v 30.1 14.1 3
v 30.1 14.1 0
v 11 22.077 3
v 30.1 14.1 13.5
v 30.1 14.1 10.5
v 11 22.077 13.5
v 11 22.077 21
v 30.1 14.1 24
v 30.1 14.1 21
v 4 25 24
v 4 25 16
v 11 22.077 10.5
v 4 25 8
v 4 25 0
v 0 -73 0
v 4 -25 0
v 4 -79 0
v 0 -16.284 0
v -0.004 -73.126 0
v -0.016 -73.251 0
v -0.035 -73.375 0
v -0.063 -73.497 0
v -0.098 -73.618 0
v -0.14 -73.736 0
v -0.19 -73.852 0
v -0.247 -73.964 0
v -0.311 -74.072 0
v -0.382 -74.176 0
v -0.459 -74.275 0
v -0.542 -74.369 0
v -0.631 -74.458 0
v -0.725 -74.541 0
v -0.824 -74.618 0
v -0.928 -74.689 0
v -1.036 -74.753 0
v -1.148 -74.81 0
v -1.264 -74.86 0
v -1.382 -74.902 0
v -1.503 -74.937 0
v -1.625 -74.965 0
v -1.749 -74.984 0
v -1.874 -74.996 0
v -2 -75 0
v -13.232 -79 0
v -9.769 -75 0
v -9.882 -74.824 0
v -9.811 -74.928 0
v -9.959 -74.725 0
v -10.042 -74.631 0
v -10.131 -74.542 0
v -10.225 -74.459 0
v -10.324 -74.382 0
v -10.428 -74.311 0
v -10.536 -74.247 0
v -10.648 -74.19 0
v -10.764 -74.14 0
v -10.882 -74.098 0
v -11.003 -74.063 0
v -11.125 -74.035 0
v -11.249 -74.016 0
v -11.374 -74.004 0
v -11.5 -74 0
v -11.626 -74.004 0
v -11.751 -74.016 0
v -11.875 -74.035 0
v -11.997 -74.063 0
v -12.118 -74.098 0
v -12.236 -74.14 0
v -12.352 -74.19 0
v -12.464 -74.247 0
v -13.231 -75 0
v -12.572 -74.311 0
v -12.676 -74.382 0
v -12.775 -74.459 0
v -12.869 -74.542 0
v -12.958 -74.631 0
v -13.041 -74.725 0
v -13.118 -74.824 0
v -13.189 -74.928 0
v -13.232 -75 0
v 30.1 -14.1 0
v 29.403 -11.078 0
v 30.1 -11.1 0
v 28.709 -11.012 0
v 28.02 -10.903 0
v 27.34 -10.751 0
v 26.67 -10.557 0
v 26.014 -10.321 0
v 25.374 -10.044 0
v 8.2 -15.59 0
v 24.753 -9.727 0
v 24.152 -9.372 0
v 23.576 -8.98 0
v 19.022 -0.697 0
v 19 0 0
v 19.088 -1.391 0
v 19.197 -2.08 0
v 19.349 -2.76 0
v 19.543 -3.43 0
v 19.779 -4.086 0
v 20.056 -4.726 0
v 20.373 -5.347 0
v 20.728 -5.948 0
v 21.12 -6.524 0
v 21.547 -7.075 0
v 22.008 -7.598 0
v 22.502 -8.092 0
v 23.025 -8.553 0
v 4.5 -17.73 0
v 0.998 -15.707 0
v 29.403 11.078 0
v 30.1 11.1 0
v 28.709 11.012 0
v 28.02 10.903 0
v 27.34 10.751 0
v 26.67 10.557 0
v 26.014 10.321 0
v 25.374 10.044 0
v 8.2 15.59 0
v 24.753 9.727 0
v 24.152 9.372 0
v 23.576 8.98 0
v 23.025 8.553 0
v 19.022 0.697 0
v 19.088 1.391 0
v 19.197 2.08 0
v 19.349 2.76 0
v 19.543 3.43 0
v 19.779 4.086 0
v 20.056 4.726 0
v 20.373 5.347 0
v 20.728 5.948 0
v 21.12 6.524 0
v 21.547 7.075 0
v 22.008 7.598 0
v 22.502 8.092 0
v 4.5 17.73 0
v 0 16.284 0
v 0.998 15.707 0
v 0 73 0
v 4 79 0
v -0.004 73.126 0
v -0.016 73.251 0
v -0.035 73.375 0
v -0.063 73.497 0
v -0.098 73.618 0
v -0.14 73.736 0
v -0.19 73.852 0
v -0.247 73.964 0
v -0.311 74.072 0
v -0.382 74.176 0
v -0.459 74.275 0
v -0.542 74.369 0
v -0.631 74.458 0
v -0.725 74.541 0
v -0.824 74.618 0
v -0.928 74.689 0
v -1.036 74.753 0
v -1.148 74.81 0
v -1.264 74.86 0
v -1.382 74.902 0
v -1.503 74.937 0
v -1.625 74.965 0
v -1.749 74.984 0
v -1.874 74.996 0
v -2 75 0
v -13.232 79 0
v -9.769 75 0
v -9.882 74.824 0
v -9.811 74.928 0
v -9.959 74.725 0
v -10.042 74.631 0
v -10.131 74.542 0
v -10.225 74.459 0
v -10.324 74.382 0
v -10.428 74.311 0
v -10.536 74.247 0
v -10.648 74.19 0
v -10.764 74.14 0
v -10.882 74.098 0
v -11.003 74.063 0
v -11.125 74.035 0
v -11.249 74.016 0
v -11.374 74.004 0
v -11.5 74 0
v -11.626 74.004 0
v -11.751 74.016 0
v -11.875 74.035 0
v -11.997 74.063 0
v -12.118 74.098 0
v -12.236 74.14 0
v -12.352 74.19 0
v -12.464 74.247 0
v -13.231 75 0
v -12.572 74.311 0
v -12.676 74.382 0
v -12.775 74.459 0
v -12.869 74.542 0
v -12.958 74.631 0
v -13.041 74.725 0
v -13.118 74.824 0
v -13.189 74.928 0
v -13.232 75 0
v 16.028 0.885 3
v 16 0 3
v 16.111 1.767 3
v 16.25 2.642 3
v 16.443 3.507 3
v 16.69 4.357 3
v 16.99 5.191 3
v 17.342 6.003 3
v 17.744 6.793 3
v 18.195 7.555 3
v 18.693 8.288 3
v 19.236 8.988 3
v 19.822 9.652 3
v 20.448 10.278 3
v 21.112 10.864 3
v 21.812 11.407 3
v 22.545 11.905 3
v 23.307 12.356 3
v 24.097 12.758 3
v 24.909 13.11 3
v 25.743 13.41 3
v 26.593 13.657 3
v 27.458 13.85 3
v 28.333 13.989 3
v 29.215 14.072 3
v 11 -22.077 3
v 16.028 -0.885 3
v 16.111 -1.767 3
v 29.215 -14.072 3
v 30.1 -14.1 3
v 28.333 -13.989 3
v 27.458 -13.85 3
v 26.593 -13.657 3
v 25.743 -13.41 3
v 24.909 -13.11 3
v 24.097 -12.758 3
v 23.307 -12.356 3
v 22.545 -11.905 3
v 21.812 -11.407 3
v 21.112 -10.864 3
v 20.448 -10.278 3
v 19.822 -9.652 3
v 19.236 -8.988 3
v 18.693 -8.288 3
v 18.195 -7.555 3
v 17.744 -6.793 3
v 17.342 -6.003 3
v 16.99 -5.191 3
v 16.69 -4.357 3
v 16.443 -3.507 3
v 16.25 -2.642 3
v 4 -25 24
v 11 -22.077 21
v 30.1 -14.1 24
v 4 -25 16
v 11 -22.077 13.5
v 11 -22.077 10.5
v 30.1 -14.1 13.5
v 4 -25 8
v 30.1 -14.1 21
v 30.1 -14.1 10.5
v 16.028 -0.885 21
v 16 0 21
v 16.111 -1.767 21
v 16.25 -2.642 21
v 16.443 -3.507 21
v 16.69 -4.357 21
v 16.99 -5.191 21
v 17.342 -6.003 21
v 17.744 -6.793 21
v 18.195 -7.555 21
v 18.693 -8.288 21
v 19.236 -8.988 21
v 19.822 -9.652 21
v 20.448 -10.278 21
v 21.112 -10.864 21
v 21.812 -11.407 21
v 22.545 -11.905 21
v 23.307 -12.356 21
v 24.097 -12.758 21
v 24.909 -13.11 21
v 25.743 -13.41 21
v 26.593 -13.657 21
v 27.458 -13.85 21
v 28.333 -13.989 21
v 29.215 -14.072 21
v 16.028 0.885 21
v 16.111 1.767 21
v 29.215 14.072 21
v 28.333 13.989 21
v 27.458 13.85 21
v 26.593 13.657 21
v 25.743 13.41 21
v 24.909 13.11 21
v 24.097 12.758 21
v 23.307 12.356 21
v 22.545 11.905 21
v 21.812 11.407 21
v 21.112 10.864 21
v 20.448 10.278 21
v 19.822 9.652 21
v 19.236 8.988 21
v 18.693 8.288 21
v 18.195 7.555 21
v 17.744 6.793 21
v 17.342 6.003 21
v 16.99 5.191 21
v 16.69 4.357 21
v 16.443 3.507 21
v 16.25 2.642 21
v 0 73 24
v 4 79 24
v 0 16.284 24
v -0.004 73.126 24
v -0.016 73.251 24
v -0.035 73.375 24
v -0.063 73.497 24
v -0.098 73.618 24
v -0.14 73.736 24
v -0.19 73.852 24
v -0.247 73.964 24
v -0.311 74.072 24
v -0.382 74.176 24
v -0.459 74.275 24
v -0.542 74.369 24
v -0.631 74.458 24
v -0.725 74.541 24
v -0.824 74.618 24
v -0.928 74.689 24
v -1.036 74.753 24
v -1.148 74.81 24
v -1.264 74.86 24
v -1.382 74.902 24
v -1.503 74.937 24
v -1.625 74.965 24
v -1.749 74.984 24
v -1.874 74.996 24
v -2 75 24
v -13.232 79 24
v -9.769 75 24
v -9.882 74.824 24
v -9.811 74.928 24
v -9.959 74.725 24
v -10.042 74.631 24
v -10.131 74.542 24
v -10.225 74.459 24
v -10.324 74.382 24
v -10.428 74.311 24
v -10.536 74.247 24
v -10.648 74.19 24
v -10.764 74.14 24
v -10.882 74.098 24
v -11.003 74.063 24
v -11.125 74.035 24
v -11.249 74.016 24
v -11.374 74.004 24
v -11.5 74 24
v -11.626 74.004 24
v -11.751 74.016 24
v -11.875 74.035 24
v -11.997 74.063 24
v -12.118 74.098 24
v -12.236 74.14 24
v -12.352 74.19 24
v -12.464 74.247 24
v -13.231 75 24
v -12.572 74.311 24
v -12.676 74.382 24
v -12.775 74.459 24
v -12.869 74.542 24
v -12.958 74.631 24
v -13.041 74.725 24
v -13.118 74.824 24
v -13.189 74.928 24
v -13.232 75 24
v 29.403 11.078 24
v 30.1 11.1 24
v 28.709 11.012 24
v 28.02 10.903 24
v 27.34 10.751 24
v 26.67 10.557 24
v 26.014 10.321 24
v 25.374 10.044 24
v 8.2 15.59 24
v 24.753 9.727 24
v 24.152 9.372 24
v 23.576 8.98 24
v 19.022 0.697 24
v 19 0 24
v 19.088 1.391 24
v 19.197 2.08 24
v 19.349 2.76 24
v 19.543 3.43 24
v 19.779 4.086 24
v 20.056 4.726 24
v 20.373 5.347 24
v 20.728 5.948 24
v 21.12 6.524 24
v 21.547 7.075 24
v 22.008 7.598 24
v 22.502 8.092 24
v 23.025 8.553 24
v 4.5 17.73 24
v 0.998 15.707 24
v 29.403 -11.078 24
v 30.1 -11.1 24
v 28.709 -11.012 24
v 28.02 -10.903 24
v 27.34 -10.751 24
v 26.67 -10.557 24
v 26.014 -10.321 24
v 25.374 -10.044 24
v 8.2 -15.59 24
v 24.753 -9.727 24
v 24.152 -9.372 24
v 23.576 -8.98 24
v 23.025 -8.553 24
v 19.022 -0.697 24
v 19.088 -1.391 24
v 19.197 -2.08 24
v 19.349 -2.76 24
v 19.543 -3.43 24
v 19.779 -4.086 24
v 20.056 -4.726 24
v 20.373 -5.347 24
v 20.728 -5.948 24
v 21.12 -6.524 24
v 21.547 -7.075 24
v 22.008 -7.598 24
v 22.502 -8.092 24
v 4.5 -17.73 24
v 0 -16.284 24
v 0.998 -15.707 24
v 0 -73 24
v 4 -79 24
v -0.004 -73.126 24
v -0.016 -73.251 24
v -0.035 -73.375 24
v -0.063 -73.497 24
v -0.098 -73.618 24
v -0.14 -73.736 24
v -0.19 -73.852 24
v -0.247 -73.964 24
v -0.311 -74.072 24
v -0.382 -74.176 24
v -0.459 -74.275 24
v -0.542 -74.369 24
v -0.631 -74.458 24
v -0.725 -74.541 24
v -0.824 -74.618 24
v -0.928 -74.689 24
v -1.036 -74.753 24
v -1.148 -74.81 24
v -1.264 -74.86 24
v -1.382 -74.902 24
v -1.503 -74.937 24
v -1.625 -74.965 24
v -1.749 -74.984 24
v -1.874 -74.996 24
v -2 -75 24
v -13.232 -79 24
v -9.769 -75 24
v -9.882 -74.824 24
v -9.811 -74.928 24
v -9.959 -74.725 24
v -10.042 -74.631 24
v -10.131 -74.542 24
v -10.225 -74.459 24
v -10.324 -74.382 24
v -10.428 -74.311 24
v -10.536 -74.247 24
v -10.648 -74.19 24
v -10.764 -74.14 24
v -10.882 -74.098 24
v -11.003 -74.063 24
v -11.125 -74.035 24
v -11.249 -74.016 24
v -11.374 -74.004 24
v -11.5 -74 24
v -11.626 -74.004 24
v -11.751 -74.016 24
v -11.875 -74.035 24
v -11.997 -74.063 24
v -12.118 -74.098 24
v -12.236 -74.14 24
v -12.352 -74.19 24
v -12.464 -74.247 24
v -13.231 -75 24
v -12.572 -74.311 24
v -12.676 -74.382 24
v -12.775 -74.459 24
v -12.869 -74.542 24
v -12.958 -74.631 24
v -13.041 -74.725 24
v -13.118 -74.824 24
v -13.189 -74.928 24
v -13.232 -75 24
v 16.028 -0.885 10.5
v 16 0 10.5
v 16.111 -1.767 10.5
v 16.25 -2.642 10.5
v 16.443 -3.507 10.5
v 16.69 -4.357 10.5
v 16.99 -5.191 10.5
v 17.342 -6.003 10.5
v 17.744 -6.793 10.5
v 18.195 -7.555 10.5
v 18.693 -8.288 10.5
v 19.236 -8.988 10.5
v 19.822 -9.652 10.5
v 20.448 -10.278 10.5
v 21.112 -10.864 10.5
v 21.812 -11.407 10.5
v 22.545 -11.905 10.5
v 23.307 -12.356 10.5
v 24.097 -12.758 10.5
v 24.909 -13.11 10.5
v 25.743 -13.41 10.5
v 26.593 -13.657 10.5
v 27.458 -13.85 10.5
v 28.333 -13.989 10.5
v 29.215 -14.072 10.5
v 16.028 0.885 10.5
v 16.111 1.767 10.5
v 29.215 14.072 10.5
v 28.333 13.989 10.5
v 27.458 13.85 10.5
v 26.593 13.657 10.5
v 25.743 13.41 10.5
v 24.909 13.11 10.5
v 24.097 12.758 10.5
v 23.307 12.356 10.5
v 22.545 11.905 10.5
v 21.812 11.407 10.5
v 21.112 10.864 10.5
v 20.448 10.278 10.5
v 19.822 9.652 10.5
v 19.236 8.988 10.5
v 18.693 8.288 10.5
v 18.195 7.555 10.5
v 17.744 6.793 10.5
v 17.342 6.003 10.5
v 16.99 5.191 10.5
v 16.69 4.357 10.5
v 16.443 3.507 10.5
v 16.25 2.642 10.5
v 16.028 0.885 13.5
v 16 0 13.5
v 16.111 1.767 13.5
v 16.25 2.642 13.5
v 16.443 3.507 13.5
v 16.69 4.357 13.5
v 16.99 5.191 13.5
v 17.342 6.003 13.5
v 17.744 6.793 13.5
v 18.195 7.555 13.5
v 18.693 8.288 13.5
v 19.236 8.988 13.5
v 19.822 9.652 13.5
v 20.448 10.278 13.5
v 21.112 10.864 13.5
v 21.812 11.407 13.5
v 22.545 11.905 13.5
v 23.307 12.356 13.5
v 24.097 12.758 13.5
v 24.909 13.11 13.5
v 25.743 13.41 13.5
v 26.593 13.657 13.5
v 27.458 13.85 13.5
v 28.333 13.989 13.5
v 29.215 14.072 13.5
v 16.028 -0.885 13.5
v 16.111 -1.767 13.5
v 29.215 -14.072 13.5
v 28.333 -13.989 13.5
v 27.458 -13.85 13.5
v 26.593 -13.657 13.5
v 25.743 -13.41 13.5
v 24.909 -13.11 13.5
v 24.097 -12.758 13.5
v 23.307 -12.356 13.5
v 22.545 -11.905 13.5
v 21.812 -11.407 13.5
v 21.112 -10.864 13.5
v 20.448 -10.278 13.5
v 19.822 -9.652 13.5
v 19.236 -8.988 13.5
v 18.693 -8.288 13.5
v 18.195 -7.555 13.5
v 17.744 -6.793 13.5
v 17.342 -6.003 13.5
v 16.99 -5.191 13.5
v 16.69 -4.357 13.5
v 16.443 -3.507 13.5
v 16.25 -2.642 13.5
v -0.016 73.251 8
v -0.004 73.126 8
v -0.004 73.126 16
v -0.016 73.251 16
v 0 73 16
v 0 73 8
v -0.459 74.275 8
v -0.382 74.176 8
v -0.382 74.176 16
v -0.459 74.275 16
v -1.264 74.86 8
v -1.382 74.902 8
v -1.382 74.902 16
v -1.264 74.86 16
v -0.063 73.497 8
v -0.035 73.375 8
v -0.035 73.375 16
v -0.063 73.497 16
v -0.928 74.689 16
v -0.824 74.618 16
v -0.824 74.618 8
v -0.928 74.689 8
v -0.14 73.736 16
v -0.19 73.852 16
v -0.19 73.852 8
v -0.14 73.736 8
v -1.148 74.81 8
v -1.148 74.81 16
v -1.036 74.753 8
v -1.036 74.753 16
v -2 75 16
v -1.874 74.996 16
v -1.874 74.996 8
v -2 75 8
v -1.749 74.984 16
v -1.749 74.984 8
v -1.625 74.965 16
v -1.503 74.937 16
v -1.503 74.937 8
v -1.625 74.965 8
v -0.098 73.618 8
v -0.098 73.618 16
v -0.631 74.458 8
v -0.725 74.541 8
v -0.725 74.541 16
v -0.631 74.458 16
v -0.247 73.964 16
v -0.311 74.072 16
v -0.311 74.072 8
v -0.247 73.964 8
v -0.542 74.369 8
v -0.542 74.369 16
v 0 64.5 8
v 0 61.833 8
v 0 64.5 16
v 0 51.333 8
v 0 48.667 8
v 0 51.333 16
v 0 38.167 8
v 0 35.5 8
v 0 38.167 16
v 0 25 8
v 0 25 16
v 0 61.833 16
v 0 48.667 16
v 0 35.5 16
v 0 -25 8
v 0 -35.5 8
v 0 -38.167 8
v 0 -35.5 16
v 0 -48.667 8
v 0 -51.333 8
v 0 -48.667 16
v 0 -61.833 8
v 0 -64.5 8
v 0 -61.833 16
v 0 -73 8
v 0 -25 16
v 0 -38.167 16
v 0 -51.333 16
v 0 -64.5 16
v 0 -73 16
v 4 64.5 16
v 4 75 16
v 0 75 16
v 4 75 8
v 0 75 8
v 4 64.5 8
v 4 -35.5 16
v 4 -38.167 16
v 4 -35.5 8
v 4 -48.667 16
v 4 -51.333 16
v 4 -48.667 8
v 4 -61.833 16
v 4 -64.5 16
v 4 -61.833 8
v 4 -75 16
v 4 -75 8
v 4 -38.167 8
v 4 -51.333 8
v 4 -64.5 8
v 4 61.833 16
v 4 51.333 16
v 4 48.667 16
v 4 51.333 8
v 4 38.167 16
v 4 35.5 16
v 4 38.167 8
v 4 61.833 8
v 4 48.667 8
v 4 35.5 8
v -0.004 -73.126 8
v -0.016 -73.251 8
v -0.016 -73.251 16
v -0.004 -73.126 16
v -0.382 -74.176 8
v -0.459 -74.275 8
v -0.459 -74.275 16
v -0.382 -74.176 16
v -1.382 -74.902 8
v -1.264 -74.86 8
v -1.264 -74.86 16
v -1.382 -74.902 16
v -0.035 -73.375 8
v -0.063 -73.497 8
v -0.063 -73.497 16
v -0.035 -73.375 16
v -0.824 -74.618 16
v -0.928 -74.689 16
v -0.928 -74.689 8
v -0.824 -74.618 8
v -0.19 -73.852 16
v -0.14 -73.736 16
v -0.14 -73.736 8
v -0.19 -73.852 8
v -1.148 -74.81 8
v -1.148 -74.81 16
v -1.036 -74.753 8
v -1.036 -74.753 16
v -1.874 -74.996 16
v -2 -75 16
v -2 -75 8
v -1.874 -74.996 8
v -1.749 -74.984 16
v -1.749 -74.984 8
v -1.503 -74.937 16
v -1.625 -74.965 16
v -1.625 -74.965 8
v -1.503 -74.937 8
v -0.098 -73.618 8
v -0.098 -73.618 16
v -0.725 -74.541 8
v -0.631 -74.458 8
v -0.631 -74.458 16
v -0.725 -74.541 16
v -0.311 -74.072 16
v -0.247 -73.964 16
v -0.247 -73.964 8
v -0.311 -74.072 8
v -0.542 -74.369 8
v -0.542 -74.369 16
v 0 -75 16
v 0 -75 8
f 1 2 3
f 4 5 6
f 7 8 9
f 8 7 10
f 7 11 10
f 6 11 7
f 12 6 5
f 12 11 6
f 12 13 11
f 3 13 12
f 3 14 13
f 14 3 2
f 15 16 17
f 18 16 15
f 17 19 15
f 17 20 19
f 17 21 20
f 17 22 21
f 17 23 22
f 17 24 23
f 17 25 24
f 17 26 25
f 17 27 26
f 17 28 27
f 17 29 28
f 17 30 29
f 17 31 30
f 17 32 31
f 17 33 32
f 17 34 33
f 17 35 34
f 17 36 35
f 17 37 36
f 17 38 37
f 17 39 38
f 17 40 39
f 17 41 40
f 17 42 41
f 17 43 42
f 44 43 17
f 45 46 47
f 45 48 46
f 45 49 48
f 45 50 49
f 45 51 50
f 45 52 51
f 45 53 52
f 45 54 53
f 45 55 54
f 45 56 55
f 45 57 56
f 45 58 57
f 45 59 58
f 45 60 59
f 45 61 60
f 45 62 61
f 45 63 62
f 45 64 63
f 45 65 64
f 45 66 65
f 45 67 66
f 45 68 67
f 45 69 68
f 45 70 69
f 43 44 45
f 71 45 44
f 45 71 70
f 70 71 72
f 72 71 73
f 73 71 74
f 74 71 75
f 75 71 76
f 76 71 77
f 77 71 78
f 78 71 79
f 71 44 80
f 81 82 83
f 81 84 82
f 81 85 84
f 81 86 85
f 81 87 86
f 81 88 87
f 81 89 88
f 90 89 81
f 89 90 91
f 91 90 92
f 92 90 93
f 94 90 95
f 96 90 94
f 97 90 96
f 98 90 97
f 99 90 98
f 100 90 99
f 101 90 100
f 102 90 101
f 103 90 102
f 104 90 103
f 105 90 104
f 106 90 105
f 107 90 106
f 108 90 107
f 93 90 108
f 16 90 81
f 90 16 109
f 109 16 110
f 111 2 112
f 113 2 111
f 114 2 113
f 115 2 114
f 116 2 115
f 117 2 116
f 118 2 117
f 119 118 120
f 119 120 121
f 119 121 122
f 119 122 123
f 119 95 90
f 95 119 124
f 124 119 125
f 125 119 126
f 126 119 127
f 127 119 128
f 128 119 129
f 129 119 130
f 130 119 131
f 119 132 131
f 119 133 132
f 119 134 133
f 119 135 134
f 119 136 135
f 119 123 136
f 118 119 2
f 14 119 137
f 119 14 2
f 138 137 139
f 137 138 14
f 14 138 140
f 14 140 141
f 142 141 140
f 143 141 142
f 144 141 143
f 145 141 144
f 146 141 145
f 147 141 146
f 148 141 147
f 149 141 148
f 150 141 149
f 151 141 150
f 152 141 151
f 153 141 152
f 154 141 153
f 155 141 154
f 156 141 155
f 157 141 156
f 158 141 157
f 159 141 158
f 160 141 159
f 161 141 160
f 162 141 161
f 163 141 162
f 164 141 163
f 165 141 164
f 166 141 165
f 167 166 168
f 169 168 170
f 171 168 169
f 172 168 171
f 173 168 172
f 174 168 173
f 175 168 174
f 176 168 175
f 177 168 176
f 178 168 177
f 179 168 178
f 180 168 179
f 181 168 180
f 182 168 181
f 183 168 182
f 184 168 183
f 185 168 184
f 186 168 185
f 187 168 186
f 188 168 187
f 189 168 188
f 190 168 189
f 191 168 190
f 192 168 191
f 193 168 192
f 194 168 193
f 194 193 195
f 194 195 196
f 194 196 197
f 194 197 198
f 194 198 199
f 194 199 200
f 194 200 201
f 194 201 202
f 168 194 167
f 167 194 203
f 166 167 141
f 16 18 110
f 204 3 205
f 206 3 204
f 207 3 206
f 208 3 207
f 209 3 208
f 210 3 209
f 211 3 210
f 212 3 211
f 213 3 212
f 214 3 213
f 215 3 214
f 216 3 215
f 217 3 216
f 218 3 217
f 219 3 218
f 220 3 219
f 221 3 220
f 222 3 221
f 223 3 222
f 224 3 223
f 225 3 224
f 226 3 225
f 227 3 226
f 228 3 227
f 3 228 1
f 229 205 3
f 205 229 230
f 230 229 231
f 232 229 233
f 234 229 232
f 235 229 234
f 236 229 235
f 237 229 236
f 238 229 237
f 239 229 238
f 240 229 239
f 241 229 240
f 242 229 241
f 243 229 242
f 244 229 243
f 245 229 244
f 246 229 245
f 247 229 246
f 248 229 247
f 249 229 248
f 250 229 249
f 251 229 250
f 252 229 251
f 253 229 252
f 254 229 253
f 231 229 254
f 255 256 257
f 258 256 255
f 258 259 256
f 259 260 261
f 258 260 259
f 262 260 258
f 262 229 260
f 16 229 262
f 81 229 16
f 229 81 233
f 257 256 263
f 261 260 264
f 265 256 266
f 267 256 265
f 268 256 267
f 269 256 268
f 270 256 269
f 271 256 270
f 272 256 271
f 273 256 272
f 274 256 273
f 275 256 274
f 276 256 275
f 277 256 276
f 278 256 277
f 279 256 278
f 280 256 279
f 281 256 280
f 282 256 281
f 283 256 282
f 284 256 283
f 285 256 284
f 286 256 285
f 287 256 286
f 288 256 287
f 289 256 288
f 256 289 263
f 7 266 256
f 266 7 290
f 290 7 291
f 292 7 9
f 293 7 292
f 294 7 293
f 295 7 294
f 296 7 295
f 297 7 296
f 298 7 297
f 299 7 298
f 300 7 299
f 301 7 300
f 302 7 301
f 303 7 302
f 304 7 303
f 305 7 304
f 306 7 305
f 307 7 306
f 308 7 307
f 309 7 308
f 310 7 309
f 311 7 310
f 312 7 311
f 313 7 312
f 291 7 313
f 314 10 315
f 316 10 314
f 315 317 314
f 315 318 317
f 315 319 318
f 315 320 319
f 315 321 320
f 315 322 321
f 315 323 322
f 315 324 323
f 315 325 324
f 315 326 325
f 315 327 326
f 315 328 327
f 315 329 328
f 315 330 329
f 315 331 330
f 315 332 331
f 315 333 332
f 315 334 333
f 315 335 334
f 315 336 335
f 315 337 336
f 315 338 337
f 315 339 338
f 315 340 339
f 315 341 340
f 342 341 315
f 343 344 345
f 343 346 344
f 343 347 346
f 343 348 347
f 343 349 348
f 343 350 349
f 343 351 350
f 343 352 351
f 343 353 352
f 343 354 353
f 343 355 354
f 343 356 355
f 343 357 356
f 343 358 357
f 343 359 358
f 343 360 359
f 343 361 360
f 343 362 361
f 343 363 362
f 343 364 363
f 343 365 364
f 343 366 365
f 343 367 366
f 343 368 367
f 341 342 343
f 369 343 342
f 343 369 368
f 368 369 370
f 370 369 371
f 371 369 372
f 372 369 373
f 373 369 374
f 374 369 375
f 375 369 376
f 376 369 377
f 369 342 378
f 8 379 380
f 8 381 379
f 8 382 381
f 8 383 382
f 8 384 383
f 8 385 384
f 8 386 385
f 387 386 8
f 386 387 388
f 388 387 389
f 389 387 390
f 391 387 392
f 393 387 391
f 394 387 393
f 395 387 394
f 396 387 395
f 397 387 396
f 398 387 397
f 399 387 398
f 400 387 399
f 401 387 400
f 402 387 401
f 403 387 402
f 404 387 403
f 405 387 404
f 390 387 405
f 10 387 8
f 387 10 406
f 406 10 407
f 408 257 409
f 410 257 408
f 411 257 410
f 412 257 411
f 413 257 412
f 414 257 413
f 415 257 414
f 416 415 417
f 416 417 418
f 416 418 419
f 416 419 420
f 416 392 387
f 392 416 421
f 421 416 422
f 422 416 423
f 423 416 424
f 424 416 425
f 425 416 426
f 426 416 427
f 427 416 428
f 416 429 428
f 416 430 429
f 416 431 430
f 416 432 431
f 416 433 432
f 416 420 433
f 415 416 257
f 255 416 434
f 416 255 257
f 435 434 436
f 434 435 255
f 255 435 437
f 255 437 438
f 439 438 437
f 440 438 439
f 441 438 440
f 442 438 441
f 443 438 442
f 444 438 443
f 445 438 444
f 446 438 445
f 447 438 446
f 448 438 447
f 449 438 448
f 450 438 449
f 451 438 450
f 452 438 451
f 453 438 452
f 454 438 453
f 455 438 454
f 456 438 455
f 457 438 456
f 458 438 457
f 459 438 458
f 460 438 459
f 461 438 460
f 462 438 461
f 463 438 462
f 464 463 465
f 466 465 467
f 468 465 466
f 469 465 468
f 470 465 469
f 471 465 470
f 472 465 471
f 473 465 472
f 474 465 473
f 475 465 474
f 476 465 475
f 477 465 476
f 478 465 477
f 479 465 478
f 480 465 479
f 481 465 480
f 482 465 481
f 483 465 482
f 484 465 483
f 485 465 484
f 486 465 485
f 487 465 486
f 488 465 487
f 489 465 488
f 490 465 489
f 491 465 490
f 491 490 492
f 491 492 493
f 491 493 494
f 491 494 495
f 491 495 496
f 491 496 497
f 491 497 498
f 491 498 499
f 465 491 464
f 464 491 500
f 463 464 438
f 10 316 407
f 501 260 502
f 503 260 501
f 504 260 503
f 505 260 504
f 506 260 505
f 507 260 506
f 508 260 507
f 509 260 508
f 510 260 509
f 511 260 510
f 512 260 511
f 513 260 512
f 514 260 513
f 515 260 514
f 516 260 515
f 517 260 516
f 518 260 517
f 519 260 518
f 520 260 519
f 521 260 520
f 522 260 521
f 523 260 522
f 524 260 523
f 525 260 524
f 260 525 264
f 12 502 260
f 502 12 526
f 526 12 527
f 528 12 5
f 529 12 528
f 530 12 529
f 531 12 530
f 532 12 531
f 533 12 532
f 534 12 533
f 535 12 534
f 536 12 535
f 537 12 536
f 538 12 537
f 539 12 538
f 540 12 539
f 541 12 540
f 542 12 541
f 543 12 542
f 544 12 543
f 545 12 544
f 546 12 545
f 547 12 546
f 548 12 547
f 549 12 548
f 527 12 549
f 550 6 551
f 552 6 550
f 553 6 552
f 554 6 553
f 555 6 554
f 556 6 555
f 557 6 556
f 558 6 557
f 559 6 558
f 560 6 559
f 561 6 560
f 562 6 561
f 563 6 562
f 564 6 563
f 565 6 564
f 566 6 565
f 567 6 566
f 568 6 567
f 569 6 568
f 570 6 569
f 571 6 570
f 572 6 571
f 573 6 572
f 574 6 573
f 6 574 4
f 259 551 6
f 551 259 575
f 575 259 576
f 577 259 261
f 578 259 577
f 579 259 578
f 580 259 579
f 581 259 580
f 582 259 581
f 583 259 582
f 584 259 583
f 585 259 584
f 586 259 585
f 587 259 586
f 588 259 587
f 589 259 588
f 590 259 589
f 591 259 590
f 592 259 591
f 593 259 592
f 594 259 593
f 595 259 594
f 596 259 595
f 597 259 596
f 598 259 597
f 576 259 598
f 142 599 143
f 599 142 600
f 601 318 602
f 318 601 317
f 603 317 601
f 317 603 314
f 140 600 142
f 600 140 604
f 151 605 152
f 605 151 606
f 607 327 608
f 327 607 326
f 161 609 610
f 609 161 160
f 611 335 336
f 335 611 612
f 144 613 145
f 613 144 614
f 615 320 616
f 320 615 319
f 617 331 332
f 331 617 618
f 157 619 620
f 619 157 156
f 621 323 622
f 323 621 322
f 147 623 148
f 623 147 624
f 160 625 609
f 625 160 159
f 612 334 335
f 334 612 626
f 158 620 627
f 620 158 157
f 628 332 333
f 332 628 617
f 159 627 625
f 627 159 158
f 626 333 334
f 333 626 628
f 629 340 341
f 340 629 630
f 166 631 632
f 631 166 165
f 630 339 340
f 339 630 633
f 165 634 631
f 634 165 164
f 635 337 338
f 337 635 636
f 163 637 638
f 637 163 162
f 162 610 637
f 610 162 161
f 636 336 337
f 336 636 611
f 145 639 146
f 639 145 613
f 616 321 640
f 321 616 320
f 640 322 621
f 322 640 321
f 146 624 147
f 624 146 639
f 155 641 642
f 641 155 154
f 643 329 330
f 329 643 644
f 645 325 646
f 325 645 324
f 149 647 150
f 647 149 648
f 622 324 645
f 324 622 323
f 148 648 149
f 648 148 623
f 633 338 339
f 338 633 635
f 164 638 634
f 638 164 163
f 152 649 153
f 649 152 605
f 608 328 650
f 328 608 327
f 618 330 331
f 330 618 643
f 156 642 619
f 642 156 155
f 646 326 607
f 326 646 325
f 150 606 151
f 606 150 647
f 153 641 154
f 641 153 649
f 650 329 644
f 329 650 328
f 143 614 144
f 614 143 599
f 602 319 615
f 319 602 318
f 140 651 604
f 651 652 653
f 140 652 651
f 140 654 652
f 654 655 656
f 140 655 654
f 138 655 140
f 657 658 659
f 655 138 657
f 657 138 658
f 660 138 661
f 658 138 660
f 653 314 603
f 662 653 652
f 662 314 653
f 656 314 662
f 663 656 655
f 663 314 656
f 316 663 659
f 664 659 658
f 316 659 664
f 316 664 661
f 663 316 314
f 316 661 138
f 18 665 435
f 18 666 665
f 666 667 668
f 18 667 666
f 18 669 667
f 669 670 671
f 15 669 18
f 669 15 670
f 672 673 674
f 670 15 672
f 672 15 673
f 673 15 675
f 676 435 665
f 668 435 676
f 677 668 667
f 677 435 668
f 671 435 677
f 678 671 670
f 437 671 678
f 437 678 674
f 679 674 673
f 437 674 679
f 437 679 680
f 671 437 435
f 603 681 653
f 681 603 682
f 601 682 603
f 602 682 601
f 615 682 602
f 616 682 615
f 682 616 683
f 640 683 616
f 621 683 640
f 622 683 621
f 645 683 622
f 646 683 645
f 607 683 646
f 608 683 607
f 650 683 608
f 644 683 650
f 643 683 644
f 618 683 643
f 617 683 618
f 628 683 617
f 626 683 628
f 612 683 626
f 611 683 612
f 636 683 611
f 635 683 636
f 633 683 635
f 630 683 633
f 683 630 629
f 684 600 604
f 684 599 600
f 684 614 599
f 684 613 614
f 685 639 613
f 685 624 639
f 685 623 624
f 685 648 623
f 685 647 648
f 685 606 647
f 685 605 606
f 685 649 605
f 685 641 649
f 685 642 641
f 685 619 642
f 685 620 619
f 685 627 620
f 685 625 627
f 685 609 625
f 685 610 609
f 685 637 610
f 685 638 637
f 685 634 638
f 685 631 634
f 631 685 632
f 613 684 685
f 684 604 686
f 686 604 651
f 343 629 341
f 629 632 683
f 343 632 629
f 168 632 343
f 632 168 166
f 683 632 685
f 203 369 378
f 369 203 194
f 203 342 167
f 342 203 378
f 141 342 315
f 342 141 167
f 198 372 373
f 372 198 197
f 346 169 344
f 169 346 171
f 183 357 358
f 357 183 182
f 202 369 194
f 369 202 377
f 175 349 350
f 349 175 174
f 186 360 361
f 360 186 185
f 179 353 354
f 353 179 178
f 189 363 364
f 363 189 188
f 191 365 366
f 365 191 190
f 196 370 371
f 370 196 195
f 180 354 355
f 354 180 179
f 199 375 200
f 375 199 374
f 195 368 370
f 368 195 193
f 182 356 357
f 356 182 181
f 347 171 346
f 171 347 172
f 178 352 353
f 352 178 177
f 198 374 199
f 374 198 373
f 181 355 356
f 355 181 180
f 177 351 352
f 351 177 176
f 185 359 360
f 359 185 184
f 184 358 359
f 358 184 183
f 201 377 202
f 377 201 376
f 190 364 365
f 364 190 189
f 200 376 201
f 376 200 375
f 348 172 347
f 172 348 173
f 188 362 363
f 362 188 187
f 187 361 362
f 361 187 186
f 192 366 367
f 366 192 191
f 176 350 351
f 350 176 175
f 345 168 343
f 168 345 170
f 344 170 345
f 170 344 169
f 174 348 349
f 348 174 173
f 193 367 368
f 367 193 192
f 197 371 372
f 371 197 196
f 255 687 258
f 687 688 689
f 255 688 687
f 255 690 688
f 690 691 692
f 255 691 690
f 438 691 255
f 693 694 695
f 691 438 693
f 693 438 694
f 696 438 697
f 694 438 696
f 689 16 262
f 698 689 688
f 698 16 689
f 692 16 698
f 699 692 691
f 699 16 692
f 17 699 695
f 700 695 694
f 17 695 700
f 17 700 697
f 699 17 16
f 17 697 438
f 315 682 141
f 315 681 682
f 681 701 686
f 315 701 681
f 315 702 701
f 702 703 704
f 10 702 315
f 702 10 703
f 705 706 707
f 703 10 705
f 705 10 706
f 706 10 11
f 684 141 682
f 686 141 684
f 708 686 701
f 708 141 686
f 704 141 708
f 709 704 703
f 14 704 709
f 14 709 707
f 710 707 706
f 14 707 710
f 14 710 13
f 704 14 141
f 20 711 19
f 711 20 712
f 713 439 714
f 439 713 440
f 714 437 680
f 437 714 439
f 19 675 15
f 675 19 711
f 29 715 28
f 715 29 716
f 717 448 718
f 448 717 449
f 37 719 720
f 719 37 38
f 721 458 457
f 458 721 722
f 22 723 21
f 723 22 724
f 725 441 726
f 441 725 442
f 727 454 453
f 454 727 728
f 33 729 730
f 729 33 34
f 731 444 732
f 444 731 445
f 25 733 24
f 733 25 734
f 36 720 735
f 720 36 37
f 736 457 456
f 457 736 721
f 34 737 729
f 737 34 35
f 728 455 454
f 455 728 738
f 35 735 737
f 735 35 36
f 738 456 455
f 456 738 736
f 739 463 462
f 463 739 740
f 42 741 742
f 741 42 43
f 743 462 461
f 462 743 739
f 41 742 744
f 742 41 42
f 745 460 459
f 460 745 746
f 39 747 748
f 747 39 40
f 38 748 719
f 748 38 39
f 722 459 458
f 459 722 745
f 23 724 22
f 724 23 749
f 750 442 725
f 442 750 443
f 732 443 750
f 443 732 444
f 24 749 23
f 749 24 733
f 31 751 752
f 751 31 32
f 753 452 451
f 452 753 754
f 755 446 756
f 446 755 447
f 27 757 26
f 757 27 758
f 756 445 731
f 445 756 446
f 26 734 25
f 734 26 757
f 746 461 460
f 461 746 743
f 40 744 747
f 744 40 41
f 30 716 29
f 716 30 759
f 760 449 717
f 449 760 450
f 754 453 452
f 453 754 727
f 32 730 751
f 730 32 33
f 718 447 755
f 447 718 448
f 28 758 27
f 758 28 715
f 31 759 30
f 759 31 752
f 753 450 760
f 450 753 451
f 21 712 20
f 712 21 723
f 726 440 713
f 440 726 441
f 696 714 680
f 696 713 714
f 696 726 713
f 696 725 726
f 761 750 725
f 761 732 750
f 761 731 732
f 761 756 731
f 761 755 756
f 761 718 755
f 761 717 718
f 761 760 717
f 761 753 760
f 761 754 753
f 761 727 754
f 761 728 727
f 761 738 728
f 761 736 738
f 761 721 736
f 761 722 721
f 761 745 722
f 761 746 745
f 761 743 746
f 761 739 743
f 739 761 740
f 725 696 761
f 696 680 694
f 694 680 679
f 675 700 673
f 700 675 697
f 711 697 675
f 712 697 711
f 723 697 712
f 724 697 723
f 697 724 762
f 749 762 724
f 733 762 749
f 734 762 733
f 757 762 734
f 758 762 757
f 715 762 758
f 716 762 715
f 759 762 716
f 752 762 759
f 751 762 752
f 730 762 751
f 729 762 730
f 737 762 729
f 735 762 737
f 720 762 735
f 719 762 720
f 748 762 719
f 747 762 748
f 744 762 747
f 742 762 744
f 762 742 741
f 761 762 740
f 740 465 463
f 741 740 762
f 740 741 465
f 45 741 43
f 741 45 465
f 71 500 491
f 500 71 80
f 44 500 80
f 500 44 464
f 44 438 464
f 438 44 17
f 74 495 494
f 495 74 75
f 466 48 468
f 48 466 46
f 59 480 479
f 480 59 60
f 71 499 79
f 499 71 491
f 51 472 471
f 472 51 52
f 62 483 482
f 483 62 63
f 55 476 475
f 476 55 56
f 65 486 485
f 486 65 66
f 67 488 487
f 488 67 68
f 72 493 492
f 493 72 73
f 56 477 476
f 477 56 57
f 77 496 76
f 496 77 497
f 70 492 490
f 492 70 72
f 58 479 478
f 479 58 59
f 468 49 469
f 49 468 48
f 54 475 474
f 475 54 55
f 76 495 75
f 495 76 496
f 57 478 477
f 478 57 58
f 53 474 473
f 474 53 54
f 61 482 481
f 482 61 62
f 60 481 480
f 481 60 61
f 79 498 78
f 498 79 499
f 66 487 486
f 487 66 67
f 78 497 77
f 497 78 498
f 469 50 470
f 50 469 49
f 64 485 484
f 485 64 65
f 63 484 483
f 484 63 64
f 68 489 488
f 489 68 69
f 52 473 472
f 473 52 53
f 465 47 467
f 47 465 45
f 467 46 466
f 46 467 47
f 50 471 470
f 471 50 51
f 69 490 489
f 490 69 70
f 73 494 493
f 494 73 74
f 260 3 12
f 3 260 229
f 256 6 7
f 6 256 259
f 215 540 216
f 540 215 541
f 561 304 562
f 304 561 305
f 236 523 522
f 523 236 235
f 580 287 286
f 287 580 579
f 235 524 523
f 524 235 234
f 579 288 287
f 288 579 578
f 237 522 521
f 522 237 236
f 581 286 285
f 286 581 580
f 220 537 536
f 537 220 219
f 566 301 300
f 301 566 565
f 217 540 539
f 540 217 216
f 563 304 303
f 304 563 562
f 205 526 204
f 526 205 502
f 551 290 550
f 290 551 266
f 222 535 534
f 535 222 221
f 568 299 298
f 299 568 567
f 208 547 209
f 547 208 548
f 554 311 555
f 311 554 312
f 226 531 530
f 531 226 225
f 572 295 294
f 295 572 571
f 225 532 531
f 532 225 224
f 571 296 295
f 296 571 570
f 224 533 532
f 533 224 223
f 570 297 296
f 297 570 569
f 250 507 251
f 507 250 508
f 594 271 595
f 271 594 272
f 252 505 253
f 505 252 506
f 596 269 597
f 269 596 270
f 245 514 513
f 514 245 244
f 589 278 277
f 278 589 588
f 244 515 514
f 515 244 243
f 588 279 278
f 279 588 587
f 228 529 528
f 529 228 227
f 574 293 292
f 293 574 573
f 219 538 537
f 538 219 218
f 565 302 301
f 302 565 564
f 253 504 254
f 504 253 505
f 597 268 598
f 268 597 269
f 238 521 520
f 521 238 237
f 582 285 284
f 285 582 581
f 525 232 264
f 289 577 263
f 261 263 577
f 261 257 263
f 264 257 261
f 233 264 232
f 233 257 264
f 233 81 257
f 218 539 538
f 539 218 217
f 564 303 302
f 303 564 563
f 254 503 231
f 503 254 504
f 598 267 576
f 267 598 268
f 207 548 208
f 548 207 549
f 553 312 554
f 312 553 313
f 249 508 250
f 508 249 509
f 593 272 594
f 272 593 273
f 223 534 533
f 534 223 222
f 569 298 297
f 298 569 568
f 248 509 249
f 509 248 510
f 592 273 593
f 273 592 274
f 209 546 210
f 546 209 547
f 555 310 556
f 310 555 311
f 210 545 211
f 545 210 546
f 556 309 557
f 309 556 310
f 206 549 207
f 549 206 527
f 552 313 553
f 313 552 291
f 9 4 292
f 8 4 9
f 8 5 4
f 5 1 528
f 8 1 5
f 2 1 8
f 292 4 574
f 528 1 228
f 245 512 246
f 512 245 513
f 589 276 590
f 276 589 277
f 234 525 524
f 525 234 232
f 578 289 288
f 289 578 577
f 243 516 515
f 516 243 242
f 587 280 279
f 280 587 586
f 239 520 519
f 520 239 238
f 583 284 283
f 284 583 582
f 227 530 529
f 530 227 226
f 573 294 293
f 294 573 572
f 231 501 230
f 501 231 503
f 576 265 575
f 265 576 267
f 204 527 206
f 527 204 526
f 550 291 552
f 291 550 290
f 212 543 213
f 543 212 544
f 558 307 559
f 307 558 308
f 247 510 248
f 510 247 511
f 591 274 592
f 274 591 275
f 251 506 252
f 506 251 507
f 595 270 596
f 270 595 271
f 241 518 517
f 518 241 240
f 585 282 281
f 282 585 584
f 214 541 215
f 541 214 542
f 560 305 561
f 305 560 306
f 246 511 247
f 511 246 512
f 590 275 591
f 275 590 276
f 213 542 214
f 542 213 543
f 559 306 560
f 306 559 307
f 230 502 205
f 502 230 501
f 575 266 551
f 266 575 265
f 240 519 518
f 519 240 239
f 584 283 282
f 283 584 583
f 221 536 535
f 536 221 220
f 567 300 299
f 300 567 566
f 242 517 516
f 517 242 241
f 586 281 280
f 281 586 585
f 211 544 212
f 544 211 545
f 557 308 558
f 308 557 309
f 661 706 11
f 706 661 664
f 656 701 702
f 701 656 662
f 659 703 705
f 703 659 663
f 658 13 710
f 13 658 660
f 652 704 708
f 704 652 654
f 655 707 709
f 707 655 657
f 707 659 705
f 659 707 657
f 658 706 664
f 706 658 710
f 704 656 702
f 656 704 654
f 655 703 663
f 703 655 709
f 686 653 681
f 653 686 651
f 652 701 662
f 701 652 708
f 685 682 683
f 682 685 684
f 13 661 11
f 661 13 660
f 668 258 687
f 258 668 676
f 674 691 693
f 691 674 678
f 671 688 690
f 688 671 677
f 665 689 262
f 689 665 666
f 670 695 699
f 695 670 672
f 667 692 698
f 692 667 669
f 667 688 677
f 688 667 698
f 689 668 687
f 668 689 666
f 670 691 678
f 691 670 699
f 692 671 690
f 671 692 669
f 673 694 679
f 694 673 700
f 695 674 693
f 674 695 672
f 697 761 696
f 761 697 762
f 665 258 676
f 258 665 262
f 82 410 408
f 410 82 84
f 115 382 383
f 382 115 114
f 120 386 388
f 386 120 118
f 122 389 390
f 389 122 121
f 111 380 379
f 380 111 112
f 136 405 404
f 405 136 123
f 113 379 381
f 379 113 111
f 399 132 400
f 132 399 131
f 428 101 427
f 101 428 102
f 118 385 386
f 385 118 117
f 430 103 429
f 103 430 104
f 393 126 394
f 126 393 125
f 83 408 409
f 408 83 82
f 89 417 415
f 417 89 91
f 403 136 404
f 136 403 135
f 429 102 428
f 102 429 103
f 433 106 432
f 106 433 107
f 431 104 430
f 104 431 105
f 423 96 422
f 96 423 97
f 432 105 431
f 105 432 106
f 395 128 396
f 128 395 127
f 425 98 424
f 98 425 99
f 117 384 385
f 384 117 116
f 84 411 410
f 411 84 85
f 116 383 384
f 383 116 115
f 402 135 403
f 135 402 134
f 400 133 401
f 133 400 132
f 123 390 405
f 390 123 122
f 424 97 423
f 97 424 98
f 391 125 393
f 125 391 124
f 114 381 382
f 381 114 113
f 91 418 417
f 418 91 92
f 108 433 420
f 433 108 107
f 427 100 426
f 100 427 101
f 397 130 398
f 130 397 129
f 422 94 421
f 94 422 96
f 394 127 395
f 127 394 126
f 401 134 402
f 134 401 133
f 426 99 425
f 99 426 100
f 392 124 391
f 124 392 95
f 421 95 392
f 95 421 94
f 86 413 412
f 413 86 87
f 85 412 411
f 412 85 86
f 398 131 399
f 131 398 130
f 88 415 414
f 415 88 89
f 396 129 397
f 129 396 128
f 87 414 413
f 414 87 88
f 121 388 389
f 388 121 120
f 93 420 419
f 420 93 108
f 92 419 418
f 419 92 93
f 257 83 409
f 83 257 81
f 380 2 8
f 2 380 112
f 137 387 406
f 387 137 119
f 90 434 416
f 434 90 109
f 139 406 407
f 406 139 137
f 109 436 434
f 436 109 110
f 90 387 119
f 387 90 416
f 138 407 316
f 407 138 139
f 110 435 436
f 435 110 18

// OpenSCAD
//circle resolution
$fn=100;

//total width of the mount
mountHeight = 24; 

//length of your phone or case
phoneLength = 150; 

//thickness of the arm
armThickness = 4; 

//width of each arm
armWidth = 8;

//maximum distance between braces in the arms
maxBridge = 13;

//height of the tab on the two ends of phone
phoneThickness = 9.5; 

//radius of the fillets
filletRadius = 2;

//diameter of the handlebar on your bike
barDiameter = 22.2; 

//thickness of the three plates
finThickness = 3; 

//thickness of the arc surface
cylinderThickness = 3; 

//offset of the cutout grabing the phone clamp, larger is looser
tolerance = 0.05;

offsetDepth = 16+cylinderThickness+barDiameter/2;

hexPts = [
    [0,-15.08-tolerance], //0
    [0,15.08+tolerance], //1
    [4.5,17.68+tolerance], //3
    [8.2,15.54+tolerance], //5
    [8.2,-15.54-tolerance], //4
    [4.5,-17.68-tolerance], //2
    ];

module hex () {
    linear_extrude(height=mountHeight) polygon(hexPts);
}

finPts = [
    [armThickness,25],
    [armThickness,-25],
    [offsetDepth,-barDiameter/2-cylinderThickness],
    [offsetDepth,barDiameter/2+cylinderThickness],
];

module hexClamp (){
    difference (){
        linear_extrude(height=mountHeight) polygon(finPts);
        translate ([11,-25,0]){    
            cube([offsetDepth,50,mountHeight],center=false);
        }
    }
    
}

module fin () {
    linear_extrude(height=finThickness) polygon(finPts);
}


module arm () {
translate([0,-phoneLength/2,0]) {
    cube(size = [armThickness,phoneLength,mountHeight], center = false);
    }
}

module armHollow(){
    translate ([0,25,armWidth]) {
    difference() {
        cube ([armThickness,phoneLength/2-25,mountHeight-armWidth*2],center=false);
        armBraces();
    }
}
}

module armBraces(){
    braceWidth   = max(2, armWidth/3);
    hollowLength = phoneLength/2 - 25;
    hollowWidth  = mountHeight-(2*armWidth);
    numBraces    = floor((hollowLength/maxBridge - 1) / (1 - braceWidth/maxBridge));
    bridgeLength = (hollowLength/(numBraces+1)) - (braceWidth*numBraces/(numBraces+1));
    echo("Brace Width: ", braceWidth);
    echo("number of Braces: ", numBraces);
    echo("bridge length: ", bridgeLength);
    
    for (i = [1:1:numBraces]) {
        translate([0,bridgeLength*i + braceWidth*(i-1)])
        cube ([armThickness, braceWidth, hollowWidth], center=false);
    }
}

module tab(){
    translate([-phoneThickness,phoneLength/2,0]) {
        cube(size=[armThickness+phoneThickness,armThickness,mountHeight], center = false);
        //fillet
        translate([phoneThickness-filletRadius,-filletRadius]) {
            difference() {
                cube(size = [filletRadius, filletRadius, mountHeight], center = false);
                union() {
                    cylinder(mountHeight, filletRadius, filletRadius, center=false);
                    translate([0, 0, armWidth]) {
                        cube(size = [
                            filletRadius,
                            filletRadius,
                            mountHeight - 2 * armWidth
                        ], center = false);
                    }
                }
            }
        }
        //bump
        difference() {
            union() {
                translate([-(cos(30)*filletRadius+filletRadius),0]) {
                    cube([cos(30)*filletRadius+filletRadius, armThickness, mountHeight], center = false);
                }
                translate([-filletRadius,sin(30)*filletRadius]) {
                    cylinder(mountHeight, filletRadius, filletRadius, center = false);
                }
            }
            translate([-2*(cos(30)*filletRadius+filletRadius),0]) {
                cube([cos(30)*filletRadius+filletRadius, armThickness, mountHeight], center = false);
            }
        }
    }
}

module tabAll() {
tab();
mirror ([0,1,0]){
    tab();
}
}

module finAll () {
translate([0,0,0]) {
    fin();
}
translate([0,0,mountHeight-finThickness]) {
    fin();
}
translate([0,0,mountHeight/2-finThickness/2]) {
    fin();
}
}

module smallCylinder () {
translate([offsetDepth,0,0]) {
cylinder(h=mountHeight, r=barDiameter/2);
}
}

module largeCylinder () {
translate([offsetDepth,0,0]) {
cylinder(h=mountHeight, r=barDiameter/2+cylinderThickness);
}
}


module positive (){
union () {
        finAll();
        tabAll();
        arm();
        largeCylinder();
        hexClamp();
}
}

module negative(){
    union () {
        smallCylinder();
        translate([offsetDepth,-20,0]) {
            cube(size=[offsetDepth,40,mountHeight], center = false);
        }
        hex();
        translate ([-7,0,0]){
            hex();
            }
        armHollow();
        mirror ([0,1,0]){
            armHollow();};
    }
}

difference (){
    positive();
    negative();
}
